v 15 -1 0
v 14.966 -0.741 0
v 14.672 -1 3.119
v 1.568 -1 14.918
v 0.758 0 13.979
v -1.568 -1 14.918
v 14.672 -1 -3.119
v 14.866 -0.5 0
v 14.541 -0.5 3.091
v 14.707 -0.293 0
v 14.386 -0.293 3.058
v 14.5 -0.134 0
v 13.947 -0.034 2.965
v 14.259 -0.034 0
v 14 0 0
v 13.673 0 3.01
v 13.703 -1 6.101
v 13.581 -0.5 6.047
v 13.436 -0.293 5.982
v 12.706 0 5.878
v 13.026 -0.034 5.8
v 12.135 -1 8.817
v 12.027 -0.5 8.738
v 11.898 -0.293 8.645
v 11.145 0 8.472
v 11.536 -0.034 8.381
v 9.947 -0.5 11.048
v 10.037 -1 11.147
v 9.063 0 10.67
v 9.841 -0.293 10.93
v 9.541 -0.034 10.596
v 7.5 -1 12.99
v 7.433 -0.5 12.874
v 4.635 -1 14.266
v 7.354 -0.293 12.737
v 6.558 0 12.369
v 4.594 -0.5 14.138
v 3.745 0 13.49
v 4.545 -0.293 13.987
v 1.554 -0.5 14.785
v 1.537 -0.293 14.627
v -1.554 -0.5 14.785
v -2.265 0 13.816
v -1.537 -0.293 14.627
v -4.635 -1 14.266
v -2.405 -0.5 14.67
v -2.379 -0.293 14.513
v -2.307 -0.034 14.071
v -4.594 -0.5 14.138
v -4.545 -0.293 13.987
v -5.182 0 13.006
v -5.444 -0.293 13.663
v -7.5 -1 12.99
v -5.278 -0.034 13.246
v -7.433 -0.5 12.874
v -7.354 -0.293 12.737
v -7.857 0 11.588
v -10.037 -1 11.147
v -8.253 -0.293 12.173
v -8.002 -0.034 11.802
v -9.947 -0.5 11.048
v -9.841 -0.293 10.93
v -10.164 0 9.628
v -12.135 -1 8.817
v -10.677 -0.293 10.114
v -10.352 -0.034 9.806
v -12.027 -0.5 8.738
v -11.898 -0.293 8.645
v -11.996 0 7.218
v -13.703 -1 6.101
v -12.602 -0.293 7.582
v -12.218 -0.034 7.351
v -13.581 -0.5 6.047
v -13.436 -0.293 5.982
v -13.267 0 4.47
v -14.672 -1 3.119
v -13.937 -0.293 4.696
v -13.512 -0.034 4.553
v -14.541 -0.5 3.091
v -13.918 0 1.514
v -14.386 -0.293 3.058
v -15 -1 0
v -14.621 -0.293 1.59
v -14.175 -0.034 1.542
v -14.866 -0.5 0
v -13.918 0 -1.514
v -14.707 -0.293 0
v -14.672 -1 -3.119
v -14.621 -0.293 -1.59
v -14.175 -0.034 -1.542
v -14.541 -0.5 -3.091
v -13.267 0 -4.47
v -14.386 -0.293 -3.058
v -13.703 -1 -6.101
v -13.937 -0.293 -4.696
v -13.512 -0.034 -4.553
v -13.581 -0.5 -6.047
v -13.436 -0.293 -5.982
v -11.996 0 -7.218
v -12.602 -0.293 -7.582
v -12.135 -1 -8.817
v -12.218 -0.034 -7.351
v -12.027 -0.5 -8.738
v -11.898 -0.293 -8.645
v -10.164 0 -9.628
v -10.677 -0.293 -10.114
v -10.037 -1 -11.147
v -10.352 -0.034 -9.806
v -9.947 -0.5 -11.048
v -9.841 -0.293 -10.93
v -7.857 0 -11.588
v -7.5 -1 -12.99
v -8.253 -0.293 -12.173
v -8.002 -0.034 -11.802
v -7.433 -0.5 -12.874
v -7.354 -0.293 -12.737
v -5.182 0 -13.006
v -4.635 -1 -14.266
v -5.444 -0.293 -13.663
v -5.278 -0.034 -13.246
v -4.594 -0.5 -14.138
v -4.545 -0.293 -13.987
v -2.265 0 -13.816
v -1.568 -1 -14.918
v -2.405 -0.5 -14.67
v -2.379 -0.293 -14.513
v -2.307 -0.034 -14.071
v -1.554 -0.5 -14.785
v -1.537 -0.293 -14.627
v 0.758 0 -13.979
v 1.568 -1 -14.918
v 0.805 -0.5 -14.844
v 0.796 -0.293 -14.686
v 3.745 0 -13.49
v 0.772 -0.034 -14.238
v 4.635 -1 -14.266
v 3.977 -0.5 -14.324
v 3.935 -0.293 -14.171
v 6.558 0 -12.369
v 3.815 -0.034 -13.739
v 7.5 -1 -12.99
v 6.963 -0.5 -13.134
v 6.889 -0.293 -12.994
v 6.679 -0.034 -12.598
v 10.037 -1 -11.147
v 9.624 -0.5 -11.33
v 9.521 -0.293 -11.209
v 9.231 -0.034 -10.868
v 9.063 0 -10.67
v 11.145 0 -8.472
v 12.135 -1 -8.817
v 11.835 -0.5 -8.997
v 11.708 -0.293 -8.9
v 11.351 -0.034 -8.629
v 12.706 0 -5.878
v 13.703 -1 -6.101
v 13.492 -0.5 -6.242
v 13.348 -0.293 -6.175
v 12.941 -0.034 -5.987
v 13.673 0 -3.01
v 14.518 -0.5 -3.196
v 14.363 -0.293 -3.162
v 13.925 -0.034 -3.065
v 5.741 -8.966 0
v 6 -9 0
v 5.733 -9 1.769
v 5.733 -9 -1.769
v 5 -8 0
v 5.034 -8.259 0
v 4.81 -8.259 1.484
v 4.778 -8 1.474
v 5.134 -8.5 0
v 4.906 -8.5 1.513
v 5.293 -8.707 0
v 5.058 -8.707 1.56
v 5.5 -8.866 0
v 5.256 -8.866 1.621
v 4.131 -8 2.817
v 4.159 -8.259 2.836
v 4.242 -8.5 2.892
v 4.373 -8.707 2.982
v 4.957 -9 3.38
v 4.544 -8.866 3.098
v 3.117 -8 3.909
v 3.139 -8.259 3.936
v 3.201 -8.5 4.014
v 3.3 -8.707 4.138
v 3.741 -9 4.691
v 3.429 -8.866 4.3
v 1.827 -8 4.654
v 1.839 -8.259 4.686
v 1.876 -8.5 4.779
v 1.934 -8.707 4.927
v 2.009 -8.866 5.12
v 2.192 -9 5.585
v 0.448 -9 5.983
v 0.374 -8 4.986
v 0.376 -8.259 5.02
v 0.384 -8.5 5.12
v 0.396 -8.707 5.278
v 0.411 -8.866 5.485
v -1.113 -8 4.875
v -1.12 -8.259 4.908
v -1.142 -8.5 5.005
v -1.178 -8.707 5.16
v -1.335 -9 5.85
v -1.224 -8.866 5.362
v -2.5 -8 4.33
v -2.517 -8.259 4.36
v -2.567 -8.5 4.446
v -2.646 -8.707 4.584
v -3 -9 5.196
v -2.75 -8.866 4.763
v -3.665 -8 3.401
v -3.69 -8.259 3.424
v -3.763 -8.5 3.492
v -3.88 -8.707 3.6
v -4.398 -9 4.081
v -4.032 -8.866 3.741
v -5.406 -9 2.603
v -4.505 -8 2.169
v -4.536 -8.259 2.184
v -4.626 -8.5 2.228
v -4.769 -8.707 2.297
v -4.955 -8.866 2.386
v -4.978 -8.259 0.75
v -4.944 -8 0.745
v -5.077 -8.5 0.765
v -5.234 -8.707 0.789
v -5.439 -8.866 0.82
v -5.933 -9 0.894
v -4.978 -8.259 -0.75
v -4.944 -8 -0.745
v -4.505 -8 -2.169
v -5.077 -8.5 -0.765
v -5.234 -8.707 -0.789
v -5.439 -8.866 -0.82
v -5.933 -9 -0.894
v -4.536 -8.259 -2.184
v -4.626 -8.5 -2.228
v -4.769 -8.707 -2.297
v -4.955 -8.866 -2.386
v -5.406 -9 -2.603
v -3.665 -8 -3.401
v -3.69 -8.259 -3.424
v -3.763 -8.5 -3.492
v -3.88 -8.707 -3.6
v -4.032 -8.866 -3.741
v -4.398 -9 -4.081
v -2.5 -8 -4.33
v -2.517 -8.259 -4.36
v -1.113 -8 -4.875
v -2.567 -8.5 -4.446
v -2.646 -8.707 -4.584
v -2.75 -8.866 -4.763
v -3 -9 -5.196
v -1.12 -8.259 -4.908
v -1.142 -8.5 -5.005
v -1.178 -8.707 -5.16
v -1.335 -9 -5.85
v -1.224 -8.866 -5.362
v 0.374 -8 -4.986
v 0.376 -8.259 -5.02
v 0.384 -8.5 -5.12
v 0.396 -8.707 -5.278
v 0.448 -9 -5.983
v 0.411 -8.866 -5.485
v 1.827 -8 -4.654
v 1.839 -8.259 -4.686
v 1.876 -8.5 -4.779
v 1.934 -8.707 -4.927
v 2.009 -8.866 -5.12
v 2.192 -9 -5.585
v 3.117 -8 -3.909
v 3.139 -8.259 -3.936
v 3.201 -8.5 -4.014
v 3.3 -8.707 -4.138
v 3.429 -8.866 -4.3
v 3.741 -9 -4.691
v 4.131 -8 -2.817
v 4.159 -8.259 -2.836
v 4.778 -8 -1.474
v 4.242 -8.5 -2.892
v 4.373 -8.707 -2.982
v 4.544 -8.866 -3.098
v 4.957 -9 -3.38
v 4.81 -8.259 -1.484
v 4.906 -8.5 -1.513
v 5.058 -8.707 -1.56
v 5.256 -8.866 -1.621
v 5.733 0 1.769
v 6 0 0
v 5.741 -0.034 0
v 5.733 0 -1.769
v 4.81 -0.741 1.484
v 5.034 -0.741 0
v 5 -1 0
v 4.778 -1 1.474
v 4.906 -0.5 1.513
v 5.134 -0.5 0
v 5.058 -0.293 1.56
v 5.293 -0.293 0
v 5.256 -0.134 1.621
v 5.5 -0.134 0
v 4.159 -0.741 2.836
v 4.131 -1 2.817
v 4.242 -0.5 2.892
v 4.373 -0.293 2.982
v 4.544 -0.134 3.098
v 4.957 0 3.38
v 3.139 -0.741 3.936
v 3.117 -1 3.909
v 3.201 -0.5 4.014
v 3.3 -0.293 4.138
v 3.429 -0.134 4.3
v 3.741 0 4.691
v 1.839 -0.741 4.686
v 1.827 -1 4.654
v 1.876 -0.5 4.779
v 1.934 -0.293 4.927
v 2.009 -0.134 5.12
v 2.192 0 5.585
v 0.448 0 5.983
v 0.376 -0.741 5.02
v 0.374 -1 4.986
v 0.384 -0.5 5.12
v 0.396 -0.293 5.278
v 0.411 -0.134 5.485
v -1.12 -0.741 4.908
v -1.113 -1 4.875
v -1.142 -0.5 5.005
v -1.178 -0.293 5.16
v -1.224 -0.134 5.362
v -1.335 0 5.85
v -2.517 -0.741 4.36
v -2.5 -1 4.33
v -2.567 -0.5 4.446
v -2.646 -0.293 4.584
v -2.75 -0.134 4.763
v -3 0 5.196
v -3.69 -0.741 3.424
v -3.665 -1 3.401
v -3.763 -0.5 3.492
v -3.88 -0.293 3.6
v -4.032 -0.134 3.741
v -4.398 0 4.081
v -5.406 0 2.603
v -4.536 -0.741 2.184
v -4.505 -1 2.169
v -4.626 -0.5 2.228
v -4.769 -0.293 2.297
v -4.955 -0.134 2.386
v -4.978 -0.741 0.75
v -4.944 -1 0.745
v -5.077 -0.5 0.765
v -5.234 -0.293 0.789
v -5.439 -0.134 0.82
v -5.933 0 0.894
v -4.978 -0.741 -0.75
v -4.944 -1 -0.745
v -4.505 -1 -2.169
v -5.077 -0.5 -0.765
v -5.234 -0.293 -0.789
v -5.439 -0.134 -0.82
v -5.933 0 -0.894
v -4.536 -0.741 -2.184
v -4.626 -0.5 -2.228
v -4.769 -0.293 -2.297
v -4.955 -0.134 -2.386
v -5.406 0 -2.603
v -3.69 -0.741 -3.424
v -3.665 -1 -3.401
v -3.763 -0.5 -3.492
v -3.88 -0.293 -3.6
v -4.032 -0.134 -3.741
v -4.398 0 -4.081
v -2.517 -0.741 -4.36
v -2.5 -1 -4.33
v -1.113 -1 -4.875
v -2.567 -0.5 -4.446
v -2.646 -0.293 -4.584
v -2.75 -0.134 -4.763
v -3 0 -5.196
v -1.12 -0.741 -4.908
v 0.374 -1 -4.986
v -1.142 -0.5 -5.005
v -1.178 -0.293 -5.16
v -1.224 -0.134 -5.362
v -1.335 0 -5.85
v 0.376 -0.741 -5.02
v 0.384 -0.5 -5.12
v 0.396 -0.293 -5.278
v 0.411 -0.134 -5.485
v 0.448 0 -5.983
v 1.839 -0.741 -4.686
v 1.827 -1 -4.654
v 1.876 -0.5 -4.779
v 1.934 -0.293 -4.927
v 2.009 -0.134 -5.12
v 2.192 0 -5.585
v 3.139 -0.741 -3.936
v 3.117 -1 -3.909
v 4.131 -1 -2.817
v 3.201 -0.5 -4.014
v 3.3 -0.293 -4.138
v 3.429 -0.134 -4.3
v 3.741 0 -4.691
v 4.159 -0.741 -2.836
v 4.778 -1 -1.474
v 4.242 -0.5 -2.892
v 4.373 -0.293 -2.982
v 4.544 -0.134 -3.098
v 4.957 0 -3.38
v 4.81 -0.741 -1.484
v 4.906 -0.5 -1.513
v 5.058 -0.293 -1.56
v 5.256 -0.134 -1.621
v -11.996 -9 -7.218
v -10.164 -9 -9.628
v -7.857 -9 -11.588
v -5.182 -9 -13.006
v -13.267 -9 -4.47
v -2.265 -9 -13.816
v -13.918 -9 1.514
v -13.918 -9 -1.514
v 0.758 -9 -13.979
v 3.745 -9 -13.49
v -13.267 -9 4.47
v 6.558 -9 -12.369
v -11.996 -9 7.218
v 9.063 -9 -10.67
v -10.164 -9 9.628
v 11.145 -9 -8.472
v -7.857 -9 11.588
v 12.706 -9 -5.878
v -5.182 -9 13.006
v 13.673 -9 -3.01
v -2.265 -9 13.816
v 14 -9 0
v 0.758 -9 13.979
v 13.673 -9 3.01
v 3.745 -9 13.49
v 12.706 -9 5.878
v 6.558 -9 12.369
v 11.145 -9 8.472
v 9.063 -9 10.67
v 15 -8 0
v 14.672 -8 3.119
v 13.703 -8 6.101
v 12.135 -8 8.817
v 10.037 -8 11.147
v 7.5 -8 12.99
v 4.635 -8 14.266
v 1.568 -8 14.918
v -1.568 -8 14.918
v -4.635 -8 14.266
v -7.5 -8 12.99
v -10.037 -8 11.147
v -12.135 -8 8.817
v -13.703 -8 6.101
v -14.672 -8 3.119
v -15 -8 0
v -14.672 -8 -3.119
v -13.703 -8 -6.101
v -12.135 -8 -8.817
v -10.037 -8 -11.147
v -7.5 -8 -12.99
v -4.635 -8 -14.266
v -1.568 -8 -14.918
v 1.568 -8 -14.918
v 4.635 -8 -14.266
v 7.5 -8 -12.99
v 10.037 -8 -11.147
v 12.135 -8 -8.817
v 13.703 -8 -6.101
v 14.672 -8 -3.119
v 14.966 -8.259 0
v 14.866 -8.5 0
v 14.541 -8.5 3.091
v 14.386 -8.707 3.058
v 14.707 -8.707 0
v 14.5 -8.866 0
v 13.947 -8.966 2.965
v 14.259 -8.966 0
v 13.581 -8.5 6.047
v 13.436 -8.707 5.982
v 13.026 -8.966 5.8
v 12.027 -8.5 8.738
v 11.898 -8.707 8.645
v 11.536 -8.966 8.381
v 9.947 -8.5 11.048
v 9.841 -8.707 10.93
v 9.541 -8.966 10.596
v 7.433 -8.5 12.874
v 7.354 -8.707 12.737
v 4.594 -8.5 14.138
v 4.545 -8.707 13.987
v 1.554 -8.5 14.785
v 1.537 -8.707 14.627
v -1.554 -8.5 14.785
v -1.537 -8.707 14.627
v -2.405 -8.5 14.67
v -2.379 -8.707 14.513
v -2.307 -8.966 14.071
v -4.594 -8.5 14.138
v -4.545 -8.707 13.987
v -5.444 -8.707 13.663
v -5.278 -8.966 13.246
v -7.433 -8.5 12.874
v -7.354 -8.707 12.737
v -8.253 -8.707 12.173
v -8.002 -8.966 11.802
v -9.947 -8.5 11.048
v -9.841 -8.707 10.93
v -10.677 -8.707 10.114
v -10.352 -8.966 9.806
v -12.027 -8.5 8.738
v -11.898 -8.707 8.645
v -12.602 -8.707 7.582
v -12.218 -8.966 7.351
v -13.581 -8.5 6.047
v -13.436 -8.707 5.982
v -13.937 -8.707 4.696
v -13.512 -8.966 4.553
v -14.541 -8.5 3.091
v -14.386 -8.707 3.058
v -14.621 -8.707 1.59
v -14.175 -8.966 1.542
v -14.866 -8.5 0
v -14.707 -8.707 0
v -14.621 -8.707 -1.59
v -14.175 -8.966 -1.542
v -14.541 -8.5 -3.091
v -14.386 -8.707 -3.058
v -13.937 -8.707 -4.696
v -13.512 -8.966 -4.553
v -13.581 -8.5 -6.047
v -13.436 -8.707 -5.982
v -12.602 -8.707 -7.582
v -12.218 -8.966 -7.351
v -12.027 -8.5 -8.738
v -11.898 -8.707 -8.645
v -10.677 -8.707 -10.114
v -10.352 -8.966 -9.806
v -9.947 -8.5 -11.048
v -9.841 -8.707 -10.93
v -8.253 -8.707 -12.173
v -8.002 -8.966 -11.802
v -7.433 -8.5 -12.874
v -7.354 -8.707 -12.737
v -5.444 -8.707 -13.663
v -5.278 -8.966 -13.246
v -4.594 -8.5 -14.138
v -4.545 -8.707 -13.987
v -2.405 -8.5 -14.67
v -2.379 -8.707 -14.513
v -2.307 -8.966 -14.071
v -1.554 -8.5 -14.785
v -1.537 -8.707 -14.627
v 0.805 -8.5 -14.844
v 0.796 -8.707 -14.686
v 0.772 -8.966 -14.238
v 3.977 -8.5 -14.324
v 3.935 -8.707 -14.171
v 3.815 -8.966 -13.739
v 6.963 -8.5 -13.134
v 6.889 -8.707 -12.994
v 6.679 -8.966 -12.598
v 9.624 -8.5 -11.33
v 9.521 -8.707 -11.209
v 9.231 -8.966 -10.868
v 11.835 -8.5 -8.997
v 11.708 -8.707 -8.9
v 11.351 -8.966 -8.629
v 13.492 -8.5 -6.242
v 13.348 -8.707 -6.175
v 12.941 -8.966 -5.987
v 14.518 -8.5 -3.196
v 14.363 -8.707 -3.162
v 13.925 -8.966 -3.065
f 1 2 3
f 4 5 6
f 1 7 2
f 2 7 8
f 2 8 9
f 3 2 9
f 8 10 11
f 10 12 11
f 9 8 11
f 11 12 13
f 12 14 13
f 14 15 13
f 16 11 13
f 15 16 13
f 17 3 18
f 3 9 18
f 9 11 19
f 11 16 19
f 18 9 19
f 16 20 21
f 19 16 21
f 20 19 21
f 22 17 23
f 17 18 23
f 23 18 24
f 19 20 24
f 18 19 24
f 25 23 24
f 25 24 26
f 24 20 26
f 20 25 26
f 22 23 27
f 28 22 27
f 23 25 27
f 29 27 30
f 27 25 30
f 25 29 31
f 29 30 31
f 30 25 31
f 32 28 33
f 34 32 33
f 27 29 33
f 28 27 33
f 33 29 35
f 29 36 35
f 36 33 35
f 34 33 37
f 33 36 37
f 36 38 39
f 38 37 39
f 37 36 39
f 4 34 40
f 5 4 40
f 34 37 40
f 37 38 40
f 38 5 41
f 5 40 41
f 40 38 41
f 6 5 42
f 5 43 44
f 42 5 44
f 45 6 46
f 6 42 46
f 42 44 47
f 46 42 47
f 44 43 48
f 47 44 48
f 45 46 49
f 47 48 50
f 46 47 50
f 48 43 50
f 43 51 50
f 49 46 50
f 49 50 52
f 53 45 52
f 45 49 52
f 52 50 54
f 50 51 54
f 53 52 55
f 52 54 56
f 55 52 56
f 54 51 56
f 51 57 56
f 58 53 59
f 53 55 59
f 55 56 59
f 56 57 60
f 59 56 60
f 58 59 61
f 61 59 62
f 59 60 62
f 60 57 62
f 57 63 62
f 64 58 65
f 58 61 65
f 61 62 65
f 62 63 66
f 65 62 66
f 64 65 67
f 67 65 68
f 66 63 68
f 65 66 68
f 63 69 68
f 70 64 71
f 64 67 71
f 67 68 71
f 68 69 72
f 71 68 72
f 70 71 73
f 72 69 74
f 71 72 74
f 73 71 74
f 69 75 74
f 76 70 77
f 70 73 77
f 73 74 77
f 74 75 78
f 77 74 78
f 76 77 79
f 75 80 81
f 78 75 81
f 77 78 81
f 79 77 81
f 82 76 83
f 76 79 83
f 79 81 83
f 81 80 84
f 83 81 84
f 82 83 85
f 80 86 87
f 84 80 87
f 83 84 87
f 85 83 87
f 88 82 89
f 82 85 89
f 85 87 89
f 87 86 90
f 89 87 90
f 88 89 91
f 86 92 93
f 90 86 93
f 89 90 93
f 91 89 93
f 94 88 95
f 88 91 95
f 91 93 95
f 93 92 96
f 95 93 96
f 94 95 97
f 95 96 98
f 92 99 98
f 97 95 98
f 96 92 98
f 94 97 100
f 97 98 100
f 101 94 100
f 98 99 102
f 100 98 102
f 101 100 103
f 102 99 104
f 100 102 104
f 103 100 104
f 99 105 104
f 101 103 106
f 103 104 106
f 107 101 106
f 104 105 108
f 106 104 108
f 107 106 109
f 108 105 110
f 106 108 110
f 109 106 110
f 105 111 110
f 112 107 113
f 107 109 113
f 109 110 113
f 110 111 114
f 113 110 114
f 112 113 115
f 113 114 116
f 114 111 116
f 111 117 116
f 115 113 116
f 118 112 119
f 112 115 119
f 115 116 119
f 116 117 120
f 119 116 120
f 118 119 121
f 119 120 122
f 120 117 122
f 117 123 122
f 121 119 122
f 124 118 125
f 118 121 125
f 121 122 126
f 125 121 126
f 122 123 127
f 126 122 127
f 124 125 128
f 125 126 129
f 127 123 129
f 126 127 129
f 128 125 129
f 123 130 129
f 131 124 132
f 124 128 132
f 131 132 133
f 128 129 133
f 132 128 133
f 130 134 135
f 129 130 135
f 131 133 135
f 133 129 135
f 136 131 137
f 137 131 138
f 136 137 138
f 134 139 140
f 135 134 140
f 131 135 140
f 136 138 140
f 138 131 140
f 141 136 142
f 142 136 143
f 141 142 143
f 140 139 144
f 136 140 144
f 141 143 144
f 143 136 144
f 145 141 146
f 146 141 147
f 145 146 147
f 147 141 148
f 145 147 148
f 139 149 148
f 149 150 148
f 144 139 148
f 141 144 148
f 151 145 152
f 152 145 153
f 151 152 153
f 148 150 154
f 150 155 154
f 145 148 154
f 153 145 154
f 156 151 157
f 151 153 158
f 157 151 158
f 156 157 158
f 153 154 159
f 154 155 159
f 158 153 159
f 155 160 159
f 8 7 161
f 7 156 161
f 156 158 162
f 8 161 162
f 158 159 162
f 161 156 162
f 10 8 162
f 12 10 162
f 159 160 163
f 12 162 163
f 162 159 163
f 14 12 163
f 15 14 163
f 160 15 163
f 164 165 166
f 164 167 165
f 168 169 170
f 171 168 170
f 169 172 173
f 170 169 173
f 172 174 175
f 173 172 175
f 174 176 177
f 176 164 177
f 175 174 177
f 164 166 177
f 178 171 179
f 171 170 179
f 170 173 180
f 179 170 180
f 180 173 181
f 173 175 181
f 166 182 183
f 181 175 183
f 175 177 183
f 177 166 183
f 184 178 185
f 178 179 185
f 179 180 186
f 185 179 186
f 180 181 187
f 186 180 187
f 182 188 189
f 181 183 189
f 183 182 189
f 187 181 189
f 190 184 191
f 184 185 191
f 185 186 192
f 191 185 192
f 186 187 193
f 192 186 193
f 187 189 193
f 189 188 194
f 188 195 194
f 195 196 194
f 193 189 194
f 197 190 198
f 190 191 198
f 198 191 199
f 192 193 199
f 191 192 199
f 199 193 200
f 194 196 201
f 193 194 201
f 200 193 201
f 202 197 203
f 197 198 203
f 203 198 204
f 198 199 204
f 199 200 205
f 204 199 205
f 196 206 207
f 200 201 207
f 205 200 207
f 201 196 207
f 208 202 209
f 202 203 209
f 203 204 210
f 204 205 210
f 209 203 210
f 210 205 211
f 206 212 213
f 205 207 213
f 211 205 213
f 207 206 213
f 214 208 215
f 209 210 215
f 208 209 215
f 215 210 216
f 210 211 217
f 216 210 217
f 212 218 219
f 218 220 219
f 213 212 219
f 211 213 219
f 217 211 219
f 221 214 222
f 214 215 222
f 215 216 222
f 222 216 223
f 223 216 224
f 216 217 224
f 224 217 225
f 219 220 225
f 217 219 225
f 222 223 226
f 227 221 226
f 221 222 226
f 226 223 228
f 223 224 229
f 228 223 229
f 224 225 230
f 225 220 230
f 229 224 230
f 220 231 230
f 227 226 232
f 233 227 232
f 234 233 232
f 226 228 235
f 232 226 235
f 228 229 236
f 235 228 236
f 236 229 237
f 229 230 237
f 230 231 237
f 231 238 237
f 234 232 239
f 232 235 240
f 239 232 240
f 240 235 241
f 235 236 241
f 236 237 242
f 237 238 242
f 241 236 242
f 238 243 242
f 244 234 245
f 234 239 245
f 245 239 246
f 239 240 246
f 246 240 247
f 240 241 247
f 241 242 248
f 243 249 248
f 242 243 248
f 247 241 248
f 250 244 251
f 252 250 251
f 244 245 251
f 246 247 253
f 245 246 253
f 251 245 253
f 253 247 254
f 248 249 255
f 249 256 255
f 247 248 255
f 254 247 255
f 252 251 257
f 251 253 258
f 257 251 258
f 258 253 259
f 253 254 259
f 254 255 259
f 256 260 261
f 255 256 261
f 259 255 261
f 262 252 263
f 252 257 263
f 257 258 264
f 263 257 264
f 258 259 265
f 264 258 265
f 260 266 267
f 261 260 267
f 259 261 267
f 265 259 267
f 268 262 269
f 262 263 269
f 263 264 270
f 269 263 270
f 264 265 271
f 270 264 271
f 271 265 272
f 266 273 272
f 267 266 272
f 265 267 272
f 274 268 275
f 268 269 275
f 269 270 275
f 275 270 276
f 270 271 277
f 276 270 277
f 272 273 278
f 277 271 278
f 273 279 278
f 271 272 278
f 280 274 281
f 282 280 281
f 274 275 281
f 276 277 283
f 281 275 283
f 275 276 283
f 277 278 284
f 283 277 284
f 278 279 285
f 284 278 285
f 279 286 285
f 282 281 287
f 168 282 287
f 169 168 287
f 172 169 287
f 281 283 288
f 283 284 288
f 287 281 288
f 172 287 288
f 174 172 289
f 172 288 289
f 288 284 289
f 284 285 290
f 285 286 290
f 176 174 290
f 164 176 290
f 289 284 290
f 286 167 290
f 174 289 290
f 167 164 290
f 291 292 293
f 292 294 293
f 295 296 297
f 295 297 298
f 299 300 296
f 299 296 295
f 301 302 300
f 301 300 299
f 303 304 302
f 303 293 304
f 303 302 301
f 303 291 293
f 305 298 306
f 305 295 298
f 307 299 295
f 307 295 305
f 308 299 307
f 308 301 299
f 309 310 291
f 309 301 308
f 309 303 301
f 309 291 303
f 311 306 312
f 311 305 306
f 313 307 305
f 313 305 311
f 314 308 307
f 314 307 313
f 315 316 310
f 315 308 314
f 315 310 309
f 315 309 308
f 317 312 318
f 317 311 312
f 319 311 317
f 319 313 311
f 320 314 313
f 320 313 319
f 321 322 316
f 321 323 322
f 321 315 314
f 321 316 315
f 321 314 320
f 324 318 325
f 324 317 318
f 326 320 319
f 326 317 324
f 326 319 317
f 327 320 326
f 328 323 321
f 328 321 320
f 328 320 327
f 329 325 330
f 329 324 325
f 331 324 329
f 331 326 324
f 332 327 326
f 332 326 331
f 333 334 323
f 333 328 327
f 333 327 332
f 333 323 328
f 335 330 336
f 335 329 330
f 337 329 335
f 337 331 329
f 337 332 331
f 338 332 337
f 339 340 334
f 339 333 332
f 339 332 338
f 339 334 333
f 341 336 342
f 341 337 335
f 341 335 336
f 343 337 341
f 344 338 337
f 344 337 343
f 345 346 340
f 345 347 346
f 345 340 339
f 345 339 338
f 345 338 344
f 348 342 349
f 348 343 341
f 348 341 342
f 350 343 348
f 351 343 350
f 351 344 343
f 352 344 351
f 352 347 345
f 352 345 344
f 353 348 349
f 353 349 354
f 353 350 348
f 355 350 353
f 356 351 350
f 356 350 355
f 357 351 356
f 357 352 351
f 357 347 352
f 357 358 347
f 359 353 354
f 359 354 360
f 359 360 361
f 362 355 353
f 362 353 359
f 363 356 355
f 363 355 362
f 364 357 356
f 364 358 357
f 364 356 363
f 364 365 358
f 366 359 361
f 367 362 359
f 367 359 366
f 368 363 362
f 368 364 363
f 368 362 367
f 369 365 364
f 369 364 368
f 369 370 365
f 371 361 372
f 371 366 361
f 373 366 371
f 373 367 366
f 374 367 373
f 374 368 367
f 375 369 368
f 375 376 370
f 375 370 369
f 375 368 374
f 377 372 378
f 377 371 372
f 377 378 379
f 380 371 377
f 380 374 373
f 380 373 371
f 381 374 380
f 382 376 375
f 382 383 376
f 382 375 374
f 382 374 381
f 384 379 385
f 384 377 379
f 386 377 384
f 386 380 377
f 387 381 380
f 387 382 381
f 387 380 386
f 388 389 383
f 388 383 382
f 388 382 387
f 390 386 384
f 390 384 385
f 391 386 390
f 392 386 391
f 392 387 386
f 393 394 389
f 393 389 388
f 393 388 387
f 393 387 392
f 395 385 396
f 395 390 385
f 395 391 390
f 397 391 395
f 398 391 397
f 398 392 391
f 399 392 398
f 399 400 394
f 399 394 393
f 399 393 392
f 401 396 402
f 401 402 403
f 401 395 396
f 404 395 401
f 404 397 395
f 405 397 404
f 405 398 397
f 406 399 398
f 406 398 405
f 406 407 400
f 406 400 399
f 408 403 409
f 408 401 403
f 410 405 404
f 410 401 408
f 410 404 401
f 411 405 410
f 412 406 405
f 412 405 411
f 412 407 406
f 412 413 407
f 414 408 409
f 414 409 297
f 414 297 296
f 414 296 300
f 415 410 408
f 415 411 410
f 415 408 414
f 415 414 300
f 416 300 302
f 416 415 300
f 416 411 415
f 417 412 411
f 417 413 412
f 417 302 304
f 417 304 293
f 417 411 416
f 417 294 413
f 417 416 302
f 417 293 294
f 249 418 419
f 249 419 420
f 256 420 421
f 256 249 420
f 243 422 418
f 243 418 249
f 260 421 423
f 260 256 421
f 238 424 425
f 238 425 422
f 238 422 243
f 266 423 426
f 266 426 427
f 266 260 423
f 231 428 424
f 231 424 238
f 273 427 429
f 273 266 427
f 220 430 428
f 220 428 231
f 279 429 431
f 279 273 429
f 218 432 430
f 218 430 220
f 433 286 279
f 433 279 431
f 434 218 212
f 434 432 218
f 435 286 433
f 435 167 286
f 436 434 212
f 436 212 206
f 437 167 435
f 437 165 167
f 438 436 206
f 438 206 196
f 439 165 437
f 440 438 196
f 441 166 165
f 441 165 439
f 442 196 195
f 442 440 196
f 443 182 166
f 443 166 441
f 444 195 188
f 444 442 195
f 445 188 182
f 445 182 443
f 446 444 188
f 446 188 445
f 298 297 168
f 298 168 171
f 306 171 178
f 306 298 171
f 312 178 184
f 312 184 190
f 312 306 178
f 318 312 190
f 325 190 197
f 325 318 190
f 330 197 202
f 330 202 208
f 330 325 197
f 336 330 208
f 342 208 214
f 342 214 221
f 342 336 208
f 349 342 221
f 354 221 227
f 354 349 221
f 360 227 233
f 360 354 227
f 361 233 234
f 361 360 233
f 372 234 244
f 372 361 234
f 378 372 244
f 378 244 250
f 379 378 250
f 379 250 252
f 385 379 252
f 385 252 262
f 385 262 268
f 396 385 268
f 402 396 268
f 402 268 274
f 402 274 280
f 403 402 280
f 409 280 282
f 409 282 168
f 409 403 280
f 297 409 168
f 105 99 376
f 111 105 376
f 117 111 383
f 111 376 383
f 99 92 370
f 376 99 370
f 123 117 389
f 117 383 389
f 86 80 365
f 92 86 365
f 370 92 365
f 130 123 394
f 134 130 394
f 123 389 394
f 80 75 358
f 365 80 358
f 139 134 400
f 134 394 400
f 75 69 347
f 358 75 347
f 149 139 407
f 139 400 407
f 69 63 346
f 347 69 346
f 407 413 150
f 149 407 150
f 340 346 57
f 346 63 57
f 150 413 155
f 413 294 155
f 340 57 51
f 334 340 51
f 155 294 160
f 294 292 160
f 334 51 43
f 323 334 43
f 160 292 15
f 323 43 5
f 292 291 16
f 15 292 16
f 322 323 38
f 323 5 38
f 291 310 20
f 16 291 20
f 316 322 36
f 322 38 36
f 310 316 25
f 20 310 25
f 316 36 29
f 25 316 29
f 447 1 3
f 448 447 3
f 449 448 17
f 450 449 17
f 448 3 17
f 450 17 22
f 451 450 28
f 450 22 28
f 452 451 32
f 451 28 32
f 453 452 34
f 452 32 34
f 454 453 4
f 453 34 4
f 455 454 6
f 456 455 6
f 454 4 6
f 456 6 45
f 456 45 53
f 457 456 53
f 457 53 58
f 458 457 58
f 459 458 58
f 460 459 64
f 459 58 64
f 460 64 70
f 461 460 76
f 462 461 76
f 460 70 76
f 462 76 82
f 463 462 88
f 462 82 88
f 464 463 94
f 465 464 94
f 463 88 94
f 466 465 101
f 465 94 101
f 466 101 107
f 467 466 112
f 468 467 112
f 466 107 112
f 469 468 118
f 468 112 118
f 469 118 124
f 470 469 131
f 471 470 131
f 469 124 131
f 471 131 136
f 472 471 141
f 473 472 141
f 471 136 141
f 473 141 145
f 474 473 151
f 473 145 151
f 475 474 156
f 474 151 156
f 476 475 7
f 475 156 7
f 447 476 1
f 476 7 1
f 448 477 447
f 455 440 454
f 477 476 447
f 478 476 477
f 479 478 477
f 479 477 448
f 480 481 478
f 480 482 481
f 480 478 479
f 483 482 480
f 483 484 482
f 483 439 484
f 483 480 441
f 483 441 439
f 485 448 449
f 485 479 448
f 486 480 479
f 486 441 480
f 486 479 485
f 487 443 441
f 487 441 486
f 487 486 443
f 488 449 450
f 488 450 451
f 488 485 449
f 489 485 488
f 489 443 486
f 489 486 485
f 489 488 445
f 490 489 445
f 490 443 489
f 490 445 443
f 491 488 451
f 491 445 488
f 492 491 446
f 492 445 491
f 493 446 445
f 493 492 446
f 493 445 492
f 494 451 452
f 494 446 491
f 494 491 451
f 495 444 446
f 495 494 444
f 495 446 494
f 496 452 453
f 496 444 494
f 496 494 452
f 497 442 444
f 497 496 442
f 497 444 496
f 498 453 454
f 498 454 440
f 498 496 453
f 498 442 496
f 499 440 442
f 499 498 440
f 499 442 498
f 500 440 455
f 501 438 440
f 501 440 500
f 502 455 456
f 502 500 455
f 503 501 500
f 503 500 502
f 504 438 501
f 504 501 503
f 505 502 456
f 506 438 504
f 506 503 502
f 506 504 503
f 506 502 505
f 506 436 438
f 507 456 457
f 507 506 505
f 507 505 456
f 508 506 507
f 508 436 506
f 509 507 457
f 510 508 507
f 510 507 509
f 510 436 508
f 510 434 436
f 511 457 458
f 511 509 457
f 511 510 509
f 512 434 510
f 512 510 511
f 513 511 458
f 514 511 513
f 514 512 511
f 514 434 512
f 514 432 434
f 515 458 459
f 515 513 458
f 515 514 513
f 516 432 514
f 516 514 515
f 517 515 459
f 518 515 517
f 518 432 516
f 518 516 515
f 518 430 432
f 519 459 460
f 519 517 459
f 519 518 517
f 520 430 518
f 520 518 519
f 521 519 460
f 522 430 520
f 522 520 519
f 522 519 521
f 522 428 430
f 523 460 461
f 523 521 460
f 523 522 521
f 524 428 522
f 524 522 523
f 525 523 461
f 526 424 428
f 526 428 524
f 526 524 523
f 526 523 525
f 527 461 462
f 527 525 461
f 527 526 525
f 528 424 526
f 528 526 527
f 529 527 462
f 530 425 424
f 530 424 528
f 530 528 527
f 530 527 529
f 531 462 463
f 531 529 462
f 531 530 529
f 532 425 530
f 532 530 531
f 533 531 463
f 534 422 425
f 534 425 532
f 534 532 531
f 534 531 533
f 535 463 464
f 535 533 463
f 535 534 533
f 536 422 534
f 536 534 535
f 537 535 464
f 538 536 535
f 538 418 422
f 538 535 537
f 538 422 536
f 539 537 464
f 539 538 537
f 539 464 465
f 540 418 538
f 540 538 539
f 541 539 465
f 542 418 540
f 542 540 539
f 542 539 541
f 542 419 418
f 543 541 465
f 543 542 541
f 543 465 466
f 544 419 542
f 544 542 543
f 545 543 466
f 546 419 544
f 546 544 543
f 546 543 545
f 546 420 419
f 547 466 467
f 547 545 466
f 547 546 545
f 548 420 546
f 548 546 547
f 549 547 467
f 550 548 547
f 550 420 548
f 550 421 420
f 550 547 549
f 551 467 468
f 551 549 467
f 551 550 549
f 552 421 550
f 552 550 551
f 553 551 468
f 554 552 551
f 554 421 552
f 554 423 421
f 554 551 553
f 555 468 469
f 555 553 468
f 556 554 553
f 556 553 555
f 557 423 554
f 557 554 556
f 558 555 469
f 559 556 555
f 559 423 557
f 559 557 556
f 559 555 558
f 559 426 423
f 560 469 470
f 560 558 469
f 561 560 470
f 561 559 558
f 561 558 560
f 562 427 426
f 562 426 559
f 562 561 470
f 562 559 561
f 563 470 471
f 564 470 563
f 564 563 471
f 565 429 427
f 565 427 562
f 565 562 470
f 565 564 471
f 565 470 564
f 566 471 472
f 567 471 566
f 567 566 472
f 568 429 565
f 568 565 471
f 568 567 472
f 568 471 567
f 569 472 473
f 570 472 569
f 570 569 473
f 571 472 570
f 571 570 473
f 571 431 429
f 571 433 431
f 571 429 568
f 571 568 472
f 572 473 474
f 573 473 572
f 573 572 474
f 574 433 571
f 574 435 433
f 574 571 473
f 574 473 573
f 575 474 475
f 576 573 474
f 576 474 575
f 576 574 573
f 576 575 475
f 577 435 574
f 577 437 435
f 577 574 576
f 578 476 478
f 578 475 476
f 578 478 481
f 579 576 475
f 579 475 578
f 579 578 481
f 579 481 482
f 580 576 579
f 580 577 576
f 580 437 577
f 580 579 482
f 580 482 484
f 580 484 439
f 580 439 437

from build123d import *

# Parameters (mm, degrees)
F0_R     = 15
F0_R_2   = 5
F1_DEPTH = 9
F2_R     = 1


with BuildPart() as f1:
    # F0 (on Front) → F1 (new body)
    with BuildSketch(Plane.XZ):
        Circle(F0_R)
        Circle(F0_R_2, mode=Mode.SUBTRACT)
    extrude(amount=F1_DEPTH)

    # F2
    f2_edges = [f1.edges().sort_by_distance(p)[0] for p in [
        (15, -4.5, 0),
        (-15, 0, 0),
        (-15, -9, 0),
        (5, -4.5, 0),
        (-5, 0, 0),
        (-5, -9, 0),
    ]]
    fillet(f2_edges, radius=F2_R)


solid = f1.part
